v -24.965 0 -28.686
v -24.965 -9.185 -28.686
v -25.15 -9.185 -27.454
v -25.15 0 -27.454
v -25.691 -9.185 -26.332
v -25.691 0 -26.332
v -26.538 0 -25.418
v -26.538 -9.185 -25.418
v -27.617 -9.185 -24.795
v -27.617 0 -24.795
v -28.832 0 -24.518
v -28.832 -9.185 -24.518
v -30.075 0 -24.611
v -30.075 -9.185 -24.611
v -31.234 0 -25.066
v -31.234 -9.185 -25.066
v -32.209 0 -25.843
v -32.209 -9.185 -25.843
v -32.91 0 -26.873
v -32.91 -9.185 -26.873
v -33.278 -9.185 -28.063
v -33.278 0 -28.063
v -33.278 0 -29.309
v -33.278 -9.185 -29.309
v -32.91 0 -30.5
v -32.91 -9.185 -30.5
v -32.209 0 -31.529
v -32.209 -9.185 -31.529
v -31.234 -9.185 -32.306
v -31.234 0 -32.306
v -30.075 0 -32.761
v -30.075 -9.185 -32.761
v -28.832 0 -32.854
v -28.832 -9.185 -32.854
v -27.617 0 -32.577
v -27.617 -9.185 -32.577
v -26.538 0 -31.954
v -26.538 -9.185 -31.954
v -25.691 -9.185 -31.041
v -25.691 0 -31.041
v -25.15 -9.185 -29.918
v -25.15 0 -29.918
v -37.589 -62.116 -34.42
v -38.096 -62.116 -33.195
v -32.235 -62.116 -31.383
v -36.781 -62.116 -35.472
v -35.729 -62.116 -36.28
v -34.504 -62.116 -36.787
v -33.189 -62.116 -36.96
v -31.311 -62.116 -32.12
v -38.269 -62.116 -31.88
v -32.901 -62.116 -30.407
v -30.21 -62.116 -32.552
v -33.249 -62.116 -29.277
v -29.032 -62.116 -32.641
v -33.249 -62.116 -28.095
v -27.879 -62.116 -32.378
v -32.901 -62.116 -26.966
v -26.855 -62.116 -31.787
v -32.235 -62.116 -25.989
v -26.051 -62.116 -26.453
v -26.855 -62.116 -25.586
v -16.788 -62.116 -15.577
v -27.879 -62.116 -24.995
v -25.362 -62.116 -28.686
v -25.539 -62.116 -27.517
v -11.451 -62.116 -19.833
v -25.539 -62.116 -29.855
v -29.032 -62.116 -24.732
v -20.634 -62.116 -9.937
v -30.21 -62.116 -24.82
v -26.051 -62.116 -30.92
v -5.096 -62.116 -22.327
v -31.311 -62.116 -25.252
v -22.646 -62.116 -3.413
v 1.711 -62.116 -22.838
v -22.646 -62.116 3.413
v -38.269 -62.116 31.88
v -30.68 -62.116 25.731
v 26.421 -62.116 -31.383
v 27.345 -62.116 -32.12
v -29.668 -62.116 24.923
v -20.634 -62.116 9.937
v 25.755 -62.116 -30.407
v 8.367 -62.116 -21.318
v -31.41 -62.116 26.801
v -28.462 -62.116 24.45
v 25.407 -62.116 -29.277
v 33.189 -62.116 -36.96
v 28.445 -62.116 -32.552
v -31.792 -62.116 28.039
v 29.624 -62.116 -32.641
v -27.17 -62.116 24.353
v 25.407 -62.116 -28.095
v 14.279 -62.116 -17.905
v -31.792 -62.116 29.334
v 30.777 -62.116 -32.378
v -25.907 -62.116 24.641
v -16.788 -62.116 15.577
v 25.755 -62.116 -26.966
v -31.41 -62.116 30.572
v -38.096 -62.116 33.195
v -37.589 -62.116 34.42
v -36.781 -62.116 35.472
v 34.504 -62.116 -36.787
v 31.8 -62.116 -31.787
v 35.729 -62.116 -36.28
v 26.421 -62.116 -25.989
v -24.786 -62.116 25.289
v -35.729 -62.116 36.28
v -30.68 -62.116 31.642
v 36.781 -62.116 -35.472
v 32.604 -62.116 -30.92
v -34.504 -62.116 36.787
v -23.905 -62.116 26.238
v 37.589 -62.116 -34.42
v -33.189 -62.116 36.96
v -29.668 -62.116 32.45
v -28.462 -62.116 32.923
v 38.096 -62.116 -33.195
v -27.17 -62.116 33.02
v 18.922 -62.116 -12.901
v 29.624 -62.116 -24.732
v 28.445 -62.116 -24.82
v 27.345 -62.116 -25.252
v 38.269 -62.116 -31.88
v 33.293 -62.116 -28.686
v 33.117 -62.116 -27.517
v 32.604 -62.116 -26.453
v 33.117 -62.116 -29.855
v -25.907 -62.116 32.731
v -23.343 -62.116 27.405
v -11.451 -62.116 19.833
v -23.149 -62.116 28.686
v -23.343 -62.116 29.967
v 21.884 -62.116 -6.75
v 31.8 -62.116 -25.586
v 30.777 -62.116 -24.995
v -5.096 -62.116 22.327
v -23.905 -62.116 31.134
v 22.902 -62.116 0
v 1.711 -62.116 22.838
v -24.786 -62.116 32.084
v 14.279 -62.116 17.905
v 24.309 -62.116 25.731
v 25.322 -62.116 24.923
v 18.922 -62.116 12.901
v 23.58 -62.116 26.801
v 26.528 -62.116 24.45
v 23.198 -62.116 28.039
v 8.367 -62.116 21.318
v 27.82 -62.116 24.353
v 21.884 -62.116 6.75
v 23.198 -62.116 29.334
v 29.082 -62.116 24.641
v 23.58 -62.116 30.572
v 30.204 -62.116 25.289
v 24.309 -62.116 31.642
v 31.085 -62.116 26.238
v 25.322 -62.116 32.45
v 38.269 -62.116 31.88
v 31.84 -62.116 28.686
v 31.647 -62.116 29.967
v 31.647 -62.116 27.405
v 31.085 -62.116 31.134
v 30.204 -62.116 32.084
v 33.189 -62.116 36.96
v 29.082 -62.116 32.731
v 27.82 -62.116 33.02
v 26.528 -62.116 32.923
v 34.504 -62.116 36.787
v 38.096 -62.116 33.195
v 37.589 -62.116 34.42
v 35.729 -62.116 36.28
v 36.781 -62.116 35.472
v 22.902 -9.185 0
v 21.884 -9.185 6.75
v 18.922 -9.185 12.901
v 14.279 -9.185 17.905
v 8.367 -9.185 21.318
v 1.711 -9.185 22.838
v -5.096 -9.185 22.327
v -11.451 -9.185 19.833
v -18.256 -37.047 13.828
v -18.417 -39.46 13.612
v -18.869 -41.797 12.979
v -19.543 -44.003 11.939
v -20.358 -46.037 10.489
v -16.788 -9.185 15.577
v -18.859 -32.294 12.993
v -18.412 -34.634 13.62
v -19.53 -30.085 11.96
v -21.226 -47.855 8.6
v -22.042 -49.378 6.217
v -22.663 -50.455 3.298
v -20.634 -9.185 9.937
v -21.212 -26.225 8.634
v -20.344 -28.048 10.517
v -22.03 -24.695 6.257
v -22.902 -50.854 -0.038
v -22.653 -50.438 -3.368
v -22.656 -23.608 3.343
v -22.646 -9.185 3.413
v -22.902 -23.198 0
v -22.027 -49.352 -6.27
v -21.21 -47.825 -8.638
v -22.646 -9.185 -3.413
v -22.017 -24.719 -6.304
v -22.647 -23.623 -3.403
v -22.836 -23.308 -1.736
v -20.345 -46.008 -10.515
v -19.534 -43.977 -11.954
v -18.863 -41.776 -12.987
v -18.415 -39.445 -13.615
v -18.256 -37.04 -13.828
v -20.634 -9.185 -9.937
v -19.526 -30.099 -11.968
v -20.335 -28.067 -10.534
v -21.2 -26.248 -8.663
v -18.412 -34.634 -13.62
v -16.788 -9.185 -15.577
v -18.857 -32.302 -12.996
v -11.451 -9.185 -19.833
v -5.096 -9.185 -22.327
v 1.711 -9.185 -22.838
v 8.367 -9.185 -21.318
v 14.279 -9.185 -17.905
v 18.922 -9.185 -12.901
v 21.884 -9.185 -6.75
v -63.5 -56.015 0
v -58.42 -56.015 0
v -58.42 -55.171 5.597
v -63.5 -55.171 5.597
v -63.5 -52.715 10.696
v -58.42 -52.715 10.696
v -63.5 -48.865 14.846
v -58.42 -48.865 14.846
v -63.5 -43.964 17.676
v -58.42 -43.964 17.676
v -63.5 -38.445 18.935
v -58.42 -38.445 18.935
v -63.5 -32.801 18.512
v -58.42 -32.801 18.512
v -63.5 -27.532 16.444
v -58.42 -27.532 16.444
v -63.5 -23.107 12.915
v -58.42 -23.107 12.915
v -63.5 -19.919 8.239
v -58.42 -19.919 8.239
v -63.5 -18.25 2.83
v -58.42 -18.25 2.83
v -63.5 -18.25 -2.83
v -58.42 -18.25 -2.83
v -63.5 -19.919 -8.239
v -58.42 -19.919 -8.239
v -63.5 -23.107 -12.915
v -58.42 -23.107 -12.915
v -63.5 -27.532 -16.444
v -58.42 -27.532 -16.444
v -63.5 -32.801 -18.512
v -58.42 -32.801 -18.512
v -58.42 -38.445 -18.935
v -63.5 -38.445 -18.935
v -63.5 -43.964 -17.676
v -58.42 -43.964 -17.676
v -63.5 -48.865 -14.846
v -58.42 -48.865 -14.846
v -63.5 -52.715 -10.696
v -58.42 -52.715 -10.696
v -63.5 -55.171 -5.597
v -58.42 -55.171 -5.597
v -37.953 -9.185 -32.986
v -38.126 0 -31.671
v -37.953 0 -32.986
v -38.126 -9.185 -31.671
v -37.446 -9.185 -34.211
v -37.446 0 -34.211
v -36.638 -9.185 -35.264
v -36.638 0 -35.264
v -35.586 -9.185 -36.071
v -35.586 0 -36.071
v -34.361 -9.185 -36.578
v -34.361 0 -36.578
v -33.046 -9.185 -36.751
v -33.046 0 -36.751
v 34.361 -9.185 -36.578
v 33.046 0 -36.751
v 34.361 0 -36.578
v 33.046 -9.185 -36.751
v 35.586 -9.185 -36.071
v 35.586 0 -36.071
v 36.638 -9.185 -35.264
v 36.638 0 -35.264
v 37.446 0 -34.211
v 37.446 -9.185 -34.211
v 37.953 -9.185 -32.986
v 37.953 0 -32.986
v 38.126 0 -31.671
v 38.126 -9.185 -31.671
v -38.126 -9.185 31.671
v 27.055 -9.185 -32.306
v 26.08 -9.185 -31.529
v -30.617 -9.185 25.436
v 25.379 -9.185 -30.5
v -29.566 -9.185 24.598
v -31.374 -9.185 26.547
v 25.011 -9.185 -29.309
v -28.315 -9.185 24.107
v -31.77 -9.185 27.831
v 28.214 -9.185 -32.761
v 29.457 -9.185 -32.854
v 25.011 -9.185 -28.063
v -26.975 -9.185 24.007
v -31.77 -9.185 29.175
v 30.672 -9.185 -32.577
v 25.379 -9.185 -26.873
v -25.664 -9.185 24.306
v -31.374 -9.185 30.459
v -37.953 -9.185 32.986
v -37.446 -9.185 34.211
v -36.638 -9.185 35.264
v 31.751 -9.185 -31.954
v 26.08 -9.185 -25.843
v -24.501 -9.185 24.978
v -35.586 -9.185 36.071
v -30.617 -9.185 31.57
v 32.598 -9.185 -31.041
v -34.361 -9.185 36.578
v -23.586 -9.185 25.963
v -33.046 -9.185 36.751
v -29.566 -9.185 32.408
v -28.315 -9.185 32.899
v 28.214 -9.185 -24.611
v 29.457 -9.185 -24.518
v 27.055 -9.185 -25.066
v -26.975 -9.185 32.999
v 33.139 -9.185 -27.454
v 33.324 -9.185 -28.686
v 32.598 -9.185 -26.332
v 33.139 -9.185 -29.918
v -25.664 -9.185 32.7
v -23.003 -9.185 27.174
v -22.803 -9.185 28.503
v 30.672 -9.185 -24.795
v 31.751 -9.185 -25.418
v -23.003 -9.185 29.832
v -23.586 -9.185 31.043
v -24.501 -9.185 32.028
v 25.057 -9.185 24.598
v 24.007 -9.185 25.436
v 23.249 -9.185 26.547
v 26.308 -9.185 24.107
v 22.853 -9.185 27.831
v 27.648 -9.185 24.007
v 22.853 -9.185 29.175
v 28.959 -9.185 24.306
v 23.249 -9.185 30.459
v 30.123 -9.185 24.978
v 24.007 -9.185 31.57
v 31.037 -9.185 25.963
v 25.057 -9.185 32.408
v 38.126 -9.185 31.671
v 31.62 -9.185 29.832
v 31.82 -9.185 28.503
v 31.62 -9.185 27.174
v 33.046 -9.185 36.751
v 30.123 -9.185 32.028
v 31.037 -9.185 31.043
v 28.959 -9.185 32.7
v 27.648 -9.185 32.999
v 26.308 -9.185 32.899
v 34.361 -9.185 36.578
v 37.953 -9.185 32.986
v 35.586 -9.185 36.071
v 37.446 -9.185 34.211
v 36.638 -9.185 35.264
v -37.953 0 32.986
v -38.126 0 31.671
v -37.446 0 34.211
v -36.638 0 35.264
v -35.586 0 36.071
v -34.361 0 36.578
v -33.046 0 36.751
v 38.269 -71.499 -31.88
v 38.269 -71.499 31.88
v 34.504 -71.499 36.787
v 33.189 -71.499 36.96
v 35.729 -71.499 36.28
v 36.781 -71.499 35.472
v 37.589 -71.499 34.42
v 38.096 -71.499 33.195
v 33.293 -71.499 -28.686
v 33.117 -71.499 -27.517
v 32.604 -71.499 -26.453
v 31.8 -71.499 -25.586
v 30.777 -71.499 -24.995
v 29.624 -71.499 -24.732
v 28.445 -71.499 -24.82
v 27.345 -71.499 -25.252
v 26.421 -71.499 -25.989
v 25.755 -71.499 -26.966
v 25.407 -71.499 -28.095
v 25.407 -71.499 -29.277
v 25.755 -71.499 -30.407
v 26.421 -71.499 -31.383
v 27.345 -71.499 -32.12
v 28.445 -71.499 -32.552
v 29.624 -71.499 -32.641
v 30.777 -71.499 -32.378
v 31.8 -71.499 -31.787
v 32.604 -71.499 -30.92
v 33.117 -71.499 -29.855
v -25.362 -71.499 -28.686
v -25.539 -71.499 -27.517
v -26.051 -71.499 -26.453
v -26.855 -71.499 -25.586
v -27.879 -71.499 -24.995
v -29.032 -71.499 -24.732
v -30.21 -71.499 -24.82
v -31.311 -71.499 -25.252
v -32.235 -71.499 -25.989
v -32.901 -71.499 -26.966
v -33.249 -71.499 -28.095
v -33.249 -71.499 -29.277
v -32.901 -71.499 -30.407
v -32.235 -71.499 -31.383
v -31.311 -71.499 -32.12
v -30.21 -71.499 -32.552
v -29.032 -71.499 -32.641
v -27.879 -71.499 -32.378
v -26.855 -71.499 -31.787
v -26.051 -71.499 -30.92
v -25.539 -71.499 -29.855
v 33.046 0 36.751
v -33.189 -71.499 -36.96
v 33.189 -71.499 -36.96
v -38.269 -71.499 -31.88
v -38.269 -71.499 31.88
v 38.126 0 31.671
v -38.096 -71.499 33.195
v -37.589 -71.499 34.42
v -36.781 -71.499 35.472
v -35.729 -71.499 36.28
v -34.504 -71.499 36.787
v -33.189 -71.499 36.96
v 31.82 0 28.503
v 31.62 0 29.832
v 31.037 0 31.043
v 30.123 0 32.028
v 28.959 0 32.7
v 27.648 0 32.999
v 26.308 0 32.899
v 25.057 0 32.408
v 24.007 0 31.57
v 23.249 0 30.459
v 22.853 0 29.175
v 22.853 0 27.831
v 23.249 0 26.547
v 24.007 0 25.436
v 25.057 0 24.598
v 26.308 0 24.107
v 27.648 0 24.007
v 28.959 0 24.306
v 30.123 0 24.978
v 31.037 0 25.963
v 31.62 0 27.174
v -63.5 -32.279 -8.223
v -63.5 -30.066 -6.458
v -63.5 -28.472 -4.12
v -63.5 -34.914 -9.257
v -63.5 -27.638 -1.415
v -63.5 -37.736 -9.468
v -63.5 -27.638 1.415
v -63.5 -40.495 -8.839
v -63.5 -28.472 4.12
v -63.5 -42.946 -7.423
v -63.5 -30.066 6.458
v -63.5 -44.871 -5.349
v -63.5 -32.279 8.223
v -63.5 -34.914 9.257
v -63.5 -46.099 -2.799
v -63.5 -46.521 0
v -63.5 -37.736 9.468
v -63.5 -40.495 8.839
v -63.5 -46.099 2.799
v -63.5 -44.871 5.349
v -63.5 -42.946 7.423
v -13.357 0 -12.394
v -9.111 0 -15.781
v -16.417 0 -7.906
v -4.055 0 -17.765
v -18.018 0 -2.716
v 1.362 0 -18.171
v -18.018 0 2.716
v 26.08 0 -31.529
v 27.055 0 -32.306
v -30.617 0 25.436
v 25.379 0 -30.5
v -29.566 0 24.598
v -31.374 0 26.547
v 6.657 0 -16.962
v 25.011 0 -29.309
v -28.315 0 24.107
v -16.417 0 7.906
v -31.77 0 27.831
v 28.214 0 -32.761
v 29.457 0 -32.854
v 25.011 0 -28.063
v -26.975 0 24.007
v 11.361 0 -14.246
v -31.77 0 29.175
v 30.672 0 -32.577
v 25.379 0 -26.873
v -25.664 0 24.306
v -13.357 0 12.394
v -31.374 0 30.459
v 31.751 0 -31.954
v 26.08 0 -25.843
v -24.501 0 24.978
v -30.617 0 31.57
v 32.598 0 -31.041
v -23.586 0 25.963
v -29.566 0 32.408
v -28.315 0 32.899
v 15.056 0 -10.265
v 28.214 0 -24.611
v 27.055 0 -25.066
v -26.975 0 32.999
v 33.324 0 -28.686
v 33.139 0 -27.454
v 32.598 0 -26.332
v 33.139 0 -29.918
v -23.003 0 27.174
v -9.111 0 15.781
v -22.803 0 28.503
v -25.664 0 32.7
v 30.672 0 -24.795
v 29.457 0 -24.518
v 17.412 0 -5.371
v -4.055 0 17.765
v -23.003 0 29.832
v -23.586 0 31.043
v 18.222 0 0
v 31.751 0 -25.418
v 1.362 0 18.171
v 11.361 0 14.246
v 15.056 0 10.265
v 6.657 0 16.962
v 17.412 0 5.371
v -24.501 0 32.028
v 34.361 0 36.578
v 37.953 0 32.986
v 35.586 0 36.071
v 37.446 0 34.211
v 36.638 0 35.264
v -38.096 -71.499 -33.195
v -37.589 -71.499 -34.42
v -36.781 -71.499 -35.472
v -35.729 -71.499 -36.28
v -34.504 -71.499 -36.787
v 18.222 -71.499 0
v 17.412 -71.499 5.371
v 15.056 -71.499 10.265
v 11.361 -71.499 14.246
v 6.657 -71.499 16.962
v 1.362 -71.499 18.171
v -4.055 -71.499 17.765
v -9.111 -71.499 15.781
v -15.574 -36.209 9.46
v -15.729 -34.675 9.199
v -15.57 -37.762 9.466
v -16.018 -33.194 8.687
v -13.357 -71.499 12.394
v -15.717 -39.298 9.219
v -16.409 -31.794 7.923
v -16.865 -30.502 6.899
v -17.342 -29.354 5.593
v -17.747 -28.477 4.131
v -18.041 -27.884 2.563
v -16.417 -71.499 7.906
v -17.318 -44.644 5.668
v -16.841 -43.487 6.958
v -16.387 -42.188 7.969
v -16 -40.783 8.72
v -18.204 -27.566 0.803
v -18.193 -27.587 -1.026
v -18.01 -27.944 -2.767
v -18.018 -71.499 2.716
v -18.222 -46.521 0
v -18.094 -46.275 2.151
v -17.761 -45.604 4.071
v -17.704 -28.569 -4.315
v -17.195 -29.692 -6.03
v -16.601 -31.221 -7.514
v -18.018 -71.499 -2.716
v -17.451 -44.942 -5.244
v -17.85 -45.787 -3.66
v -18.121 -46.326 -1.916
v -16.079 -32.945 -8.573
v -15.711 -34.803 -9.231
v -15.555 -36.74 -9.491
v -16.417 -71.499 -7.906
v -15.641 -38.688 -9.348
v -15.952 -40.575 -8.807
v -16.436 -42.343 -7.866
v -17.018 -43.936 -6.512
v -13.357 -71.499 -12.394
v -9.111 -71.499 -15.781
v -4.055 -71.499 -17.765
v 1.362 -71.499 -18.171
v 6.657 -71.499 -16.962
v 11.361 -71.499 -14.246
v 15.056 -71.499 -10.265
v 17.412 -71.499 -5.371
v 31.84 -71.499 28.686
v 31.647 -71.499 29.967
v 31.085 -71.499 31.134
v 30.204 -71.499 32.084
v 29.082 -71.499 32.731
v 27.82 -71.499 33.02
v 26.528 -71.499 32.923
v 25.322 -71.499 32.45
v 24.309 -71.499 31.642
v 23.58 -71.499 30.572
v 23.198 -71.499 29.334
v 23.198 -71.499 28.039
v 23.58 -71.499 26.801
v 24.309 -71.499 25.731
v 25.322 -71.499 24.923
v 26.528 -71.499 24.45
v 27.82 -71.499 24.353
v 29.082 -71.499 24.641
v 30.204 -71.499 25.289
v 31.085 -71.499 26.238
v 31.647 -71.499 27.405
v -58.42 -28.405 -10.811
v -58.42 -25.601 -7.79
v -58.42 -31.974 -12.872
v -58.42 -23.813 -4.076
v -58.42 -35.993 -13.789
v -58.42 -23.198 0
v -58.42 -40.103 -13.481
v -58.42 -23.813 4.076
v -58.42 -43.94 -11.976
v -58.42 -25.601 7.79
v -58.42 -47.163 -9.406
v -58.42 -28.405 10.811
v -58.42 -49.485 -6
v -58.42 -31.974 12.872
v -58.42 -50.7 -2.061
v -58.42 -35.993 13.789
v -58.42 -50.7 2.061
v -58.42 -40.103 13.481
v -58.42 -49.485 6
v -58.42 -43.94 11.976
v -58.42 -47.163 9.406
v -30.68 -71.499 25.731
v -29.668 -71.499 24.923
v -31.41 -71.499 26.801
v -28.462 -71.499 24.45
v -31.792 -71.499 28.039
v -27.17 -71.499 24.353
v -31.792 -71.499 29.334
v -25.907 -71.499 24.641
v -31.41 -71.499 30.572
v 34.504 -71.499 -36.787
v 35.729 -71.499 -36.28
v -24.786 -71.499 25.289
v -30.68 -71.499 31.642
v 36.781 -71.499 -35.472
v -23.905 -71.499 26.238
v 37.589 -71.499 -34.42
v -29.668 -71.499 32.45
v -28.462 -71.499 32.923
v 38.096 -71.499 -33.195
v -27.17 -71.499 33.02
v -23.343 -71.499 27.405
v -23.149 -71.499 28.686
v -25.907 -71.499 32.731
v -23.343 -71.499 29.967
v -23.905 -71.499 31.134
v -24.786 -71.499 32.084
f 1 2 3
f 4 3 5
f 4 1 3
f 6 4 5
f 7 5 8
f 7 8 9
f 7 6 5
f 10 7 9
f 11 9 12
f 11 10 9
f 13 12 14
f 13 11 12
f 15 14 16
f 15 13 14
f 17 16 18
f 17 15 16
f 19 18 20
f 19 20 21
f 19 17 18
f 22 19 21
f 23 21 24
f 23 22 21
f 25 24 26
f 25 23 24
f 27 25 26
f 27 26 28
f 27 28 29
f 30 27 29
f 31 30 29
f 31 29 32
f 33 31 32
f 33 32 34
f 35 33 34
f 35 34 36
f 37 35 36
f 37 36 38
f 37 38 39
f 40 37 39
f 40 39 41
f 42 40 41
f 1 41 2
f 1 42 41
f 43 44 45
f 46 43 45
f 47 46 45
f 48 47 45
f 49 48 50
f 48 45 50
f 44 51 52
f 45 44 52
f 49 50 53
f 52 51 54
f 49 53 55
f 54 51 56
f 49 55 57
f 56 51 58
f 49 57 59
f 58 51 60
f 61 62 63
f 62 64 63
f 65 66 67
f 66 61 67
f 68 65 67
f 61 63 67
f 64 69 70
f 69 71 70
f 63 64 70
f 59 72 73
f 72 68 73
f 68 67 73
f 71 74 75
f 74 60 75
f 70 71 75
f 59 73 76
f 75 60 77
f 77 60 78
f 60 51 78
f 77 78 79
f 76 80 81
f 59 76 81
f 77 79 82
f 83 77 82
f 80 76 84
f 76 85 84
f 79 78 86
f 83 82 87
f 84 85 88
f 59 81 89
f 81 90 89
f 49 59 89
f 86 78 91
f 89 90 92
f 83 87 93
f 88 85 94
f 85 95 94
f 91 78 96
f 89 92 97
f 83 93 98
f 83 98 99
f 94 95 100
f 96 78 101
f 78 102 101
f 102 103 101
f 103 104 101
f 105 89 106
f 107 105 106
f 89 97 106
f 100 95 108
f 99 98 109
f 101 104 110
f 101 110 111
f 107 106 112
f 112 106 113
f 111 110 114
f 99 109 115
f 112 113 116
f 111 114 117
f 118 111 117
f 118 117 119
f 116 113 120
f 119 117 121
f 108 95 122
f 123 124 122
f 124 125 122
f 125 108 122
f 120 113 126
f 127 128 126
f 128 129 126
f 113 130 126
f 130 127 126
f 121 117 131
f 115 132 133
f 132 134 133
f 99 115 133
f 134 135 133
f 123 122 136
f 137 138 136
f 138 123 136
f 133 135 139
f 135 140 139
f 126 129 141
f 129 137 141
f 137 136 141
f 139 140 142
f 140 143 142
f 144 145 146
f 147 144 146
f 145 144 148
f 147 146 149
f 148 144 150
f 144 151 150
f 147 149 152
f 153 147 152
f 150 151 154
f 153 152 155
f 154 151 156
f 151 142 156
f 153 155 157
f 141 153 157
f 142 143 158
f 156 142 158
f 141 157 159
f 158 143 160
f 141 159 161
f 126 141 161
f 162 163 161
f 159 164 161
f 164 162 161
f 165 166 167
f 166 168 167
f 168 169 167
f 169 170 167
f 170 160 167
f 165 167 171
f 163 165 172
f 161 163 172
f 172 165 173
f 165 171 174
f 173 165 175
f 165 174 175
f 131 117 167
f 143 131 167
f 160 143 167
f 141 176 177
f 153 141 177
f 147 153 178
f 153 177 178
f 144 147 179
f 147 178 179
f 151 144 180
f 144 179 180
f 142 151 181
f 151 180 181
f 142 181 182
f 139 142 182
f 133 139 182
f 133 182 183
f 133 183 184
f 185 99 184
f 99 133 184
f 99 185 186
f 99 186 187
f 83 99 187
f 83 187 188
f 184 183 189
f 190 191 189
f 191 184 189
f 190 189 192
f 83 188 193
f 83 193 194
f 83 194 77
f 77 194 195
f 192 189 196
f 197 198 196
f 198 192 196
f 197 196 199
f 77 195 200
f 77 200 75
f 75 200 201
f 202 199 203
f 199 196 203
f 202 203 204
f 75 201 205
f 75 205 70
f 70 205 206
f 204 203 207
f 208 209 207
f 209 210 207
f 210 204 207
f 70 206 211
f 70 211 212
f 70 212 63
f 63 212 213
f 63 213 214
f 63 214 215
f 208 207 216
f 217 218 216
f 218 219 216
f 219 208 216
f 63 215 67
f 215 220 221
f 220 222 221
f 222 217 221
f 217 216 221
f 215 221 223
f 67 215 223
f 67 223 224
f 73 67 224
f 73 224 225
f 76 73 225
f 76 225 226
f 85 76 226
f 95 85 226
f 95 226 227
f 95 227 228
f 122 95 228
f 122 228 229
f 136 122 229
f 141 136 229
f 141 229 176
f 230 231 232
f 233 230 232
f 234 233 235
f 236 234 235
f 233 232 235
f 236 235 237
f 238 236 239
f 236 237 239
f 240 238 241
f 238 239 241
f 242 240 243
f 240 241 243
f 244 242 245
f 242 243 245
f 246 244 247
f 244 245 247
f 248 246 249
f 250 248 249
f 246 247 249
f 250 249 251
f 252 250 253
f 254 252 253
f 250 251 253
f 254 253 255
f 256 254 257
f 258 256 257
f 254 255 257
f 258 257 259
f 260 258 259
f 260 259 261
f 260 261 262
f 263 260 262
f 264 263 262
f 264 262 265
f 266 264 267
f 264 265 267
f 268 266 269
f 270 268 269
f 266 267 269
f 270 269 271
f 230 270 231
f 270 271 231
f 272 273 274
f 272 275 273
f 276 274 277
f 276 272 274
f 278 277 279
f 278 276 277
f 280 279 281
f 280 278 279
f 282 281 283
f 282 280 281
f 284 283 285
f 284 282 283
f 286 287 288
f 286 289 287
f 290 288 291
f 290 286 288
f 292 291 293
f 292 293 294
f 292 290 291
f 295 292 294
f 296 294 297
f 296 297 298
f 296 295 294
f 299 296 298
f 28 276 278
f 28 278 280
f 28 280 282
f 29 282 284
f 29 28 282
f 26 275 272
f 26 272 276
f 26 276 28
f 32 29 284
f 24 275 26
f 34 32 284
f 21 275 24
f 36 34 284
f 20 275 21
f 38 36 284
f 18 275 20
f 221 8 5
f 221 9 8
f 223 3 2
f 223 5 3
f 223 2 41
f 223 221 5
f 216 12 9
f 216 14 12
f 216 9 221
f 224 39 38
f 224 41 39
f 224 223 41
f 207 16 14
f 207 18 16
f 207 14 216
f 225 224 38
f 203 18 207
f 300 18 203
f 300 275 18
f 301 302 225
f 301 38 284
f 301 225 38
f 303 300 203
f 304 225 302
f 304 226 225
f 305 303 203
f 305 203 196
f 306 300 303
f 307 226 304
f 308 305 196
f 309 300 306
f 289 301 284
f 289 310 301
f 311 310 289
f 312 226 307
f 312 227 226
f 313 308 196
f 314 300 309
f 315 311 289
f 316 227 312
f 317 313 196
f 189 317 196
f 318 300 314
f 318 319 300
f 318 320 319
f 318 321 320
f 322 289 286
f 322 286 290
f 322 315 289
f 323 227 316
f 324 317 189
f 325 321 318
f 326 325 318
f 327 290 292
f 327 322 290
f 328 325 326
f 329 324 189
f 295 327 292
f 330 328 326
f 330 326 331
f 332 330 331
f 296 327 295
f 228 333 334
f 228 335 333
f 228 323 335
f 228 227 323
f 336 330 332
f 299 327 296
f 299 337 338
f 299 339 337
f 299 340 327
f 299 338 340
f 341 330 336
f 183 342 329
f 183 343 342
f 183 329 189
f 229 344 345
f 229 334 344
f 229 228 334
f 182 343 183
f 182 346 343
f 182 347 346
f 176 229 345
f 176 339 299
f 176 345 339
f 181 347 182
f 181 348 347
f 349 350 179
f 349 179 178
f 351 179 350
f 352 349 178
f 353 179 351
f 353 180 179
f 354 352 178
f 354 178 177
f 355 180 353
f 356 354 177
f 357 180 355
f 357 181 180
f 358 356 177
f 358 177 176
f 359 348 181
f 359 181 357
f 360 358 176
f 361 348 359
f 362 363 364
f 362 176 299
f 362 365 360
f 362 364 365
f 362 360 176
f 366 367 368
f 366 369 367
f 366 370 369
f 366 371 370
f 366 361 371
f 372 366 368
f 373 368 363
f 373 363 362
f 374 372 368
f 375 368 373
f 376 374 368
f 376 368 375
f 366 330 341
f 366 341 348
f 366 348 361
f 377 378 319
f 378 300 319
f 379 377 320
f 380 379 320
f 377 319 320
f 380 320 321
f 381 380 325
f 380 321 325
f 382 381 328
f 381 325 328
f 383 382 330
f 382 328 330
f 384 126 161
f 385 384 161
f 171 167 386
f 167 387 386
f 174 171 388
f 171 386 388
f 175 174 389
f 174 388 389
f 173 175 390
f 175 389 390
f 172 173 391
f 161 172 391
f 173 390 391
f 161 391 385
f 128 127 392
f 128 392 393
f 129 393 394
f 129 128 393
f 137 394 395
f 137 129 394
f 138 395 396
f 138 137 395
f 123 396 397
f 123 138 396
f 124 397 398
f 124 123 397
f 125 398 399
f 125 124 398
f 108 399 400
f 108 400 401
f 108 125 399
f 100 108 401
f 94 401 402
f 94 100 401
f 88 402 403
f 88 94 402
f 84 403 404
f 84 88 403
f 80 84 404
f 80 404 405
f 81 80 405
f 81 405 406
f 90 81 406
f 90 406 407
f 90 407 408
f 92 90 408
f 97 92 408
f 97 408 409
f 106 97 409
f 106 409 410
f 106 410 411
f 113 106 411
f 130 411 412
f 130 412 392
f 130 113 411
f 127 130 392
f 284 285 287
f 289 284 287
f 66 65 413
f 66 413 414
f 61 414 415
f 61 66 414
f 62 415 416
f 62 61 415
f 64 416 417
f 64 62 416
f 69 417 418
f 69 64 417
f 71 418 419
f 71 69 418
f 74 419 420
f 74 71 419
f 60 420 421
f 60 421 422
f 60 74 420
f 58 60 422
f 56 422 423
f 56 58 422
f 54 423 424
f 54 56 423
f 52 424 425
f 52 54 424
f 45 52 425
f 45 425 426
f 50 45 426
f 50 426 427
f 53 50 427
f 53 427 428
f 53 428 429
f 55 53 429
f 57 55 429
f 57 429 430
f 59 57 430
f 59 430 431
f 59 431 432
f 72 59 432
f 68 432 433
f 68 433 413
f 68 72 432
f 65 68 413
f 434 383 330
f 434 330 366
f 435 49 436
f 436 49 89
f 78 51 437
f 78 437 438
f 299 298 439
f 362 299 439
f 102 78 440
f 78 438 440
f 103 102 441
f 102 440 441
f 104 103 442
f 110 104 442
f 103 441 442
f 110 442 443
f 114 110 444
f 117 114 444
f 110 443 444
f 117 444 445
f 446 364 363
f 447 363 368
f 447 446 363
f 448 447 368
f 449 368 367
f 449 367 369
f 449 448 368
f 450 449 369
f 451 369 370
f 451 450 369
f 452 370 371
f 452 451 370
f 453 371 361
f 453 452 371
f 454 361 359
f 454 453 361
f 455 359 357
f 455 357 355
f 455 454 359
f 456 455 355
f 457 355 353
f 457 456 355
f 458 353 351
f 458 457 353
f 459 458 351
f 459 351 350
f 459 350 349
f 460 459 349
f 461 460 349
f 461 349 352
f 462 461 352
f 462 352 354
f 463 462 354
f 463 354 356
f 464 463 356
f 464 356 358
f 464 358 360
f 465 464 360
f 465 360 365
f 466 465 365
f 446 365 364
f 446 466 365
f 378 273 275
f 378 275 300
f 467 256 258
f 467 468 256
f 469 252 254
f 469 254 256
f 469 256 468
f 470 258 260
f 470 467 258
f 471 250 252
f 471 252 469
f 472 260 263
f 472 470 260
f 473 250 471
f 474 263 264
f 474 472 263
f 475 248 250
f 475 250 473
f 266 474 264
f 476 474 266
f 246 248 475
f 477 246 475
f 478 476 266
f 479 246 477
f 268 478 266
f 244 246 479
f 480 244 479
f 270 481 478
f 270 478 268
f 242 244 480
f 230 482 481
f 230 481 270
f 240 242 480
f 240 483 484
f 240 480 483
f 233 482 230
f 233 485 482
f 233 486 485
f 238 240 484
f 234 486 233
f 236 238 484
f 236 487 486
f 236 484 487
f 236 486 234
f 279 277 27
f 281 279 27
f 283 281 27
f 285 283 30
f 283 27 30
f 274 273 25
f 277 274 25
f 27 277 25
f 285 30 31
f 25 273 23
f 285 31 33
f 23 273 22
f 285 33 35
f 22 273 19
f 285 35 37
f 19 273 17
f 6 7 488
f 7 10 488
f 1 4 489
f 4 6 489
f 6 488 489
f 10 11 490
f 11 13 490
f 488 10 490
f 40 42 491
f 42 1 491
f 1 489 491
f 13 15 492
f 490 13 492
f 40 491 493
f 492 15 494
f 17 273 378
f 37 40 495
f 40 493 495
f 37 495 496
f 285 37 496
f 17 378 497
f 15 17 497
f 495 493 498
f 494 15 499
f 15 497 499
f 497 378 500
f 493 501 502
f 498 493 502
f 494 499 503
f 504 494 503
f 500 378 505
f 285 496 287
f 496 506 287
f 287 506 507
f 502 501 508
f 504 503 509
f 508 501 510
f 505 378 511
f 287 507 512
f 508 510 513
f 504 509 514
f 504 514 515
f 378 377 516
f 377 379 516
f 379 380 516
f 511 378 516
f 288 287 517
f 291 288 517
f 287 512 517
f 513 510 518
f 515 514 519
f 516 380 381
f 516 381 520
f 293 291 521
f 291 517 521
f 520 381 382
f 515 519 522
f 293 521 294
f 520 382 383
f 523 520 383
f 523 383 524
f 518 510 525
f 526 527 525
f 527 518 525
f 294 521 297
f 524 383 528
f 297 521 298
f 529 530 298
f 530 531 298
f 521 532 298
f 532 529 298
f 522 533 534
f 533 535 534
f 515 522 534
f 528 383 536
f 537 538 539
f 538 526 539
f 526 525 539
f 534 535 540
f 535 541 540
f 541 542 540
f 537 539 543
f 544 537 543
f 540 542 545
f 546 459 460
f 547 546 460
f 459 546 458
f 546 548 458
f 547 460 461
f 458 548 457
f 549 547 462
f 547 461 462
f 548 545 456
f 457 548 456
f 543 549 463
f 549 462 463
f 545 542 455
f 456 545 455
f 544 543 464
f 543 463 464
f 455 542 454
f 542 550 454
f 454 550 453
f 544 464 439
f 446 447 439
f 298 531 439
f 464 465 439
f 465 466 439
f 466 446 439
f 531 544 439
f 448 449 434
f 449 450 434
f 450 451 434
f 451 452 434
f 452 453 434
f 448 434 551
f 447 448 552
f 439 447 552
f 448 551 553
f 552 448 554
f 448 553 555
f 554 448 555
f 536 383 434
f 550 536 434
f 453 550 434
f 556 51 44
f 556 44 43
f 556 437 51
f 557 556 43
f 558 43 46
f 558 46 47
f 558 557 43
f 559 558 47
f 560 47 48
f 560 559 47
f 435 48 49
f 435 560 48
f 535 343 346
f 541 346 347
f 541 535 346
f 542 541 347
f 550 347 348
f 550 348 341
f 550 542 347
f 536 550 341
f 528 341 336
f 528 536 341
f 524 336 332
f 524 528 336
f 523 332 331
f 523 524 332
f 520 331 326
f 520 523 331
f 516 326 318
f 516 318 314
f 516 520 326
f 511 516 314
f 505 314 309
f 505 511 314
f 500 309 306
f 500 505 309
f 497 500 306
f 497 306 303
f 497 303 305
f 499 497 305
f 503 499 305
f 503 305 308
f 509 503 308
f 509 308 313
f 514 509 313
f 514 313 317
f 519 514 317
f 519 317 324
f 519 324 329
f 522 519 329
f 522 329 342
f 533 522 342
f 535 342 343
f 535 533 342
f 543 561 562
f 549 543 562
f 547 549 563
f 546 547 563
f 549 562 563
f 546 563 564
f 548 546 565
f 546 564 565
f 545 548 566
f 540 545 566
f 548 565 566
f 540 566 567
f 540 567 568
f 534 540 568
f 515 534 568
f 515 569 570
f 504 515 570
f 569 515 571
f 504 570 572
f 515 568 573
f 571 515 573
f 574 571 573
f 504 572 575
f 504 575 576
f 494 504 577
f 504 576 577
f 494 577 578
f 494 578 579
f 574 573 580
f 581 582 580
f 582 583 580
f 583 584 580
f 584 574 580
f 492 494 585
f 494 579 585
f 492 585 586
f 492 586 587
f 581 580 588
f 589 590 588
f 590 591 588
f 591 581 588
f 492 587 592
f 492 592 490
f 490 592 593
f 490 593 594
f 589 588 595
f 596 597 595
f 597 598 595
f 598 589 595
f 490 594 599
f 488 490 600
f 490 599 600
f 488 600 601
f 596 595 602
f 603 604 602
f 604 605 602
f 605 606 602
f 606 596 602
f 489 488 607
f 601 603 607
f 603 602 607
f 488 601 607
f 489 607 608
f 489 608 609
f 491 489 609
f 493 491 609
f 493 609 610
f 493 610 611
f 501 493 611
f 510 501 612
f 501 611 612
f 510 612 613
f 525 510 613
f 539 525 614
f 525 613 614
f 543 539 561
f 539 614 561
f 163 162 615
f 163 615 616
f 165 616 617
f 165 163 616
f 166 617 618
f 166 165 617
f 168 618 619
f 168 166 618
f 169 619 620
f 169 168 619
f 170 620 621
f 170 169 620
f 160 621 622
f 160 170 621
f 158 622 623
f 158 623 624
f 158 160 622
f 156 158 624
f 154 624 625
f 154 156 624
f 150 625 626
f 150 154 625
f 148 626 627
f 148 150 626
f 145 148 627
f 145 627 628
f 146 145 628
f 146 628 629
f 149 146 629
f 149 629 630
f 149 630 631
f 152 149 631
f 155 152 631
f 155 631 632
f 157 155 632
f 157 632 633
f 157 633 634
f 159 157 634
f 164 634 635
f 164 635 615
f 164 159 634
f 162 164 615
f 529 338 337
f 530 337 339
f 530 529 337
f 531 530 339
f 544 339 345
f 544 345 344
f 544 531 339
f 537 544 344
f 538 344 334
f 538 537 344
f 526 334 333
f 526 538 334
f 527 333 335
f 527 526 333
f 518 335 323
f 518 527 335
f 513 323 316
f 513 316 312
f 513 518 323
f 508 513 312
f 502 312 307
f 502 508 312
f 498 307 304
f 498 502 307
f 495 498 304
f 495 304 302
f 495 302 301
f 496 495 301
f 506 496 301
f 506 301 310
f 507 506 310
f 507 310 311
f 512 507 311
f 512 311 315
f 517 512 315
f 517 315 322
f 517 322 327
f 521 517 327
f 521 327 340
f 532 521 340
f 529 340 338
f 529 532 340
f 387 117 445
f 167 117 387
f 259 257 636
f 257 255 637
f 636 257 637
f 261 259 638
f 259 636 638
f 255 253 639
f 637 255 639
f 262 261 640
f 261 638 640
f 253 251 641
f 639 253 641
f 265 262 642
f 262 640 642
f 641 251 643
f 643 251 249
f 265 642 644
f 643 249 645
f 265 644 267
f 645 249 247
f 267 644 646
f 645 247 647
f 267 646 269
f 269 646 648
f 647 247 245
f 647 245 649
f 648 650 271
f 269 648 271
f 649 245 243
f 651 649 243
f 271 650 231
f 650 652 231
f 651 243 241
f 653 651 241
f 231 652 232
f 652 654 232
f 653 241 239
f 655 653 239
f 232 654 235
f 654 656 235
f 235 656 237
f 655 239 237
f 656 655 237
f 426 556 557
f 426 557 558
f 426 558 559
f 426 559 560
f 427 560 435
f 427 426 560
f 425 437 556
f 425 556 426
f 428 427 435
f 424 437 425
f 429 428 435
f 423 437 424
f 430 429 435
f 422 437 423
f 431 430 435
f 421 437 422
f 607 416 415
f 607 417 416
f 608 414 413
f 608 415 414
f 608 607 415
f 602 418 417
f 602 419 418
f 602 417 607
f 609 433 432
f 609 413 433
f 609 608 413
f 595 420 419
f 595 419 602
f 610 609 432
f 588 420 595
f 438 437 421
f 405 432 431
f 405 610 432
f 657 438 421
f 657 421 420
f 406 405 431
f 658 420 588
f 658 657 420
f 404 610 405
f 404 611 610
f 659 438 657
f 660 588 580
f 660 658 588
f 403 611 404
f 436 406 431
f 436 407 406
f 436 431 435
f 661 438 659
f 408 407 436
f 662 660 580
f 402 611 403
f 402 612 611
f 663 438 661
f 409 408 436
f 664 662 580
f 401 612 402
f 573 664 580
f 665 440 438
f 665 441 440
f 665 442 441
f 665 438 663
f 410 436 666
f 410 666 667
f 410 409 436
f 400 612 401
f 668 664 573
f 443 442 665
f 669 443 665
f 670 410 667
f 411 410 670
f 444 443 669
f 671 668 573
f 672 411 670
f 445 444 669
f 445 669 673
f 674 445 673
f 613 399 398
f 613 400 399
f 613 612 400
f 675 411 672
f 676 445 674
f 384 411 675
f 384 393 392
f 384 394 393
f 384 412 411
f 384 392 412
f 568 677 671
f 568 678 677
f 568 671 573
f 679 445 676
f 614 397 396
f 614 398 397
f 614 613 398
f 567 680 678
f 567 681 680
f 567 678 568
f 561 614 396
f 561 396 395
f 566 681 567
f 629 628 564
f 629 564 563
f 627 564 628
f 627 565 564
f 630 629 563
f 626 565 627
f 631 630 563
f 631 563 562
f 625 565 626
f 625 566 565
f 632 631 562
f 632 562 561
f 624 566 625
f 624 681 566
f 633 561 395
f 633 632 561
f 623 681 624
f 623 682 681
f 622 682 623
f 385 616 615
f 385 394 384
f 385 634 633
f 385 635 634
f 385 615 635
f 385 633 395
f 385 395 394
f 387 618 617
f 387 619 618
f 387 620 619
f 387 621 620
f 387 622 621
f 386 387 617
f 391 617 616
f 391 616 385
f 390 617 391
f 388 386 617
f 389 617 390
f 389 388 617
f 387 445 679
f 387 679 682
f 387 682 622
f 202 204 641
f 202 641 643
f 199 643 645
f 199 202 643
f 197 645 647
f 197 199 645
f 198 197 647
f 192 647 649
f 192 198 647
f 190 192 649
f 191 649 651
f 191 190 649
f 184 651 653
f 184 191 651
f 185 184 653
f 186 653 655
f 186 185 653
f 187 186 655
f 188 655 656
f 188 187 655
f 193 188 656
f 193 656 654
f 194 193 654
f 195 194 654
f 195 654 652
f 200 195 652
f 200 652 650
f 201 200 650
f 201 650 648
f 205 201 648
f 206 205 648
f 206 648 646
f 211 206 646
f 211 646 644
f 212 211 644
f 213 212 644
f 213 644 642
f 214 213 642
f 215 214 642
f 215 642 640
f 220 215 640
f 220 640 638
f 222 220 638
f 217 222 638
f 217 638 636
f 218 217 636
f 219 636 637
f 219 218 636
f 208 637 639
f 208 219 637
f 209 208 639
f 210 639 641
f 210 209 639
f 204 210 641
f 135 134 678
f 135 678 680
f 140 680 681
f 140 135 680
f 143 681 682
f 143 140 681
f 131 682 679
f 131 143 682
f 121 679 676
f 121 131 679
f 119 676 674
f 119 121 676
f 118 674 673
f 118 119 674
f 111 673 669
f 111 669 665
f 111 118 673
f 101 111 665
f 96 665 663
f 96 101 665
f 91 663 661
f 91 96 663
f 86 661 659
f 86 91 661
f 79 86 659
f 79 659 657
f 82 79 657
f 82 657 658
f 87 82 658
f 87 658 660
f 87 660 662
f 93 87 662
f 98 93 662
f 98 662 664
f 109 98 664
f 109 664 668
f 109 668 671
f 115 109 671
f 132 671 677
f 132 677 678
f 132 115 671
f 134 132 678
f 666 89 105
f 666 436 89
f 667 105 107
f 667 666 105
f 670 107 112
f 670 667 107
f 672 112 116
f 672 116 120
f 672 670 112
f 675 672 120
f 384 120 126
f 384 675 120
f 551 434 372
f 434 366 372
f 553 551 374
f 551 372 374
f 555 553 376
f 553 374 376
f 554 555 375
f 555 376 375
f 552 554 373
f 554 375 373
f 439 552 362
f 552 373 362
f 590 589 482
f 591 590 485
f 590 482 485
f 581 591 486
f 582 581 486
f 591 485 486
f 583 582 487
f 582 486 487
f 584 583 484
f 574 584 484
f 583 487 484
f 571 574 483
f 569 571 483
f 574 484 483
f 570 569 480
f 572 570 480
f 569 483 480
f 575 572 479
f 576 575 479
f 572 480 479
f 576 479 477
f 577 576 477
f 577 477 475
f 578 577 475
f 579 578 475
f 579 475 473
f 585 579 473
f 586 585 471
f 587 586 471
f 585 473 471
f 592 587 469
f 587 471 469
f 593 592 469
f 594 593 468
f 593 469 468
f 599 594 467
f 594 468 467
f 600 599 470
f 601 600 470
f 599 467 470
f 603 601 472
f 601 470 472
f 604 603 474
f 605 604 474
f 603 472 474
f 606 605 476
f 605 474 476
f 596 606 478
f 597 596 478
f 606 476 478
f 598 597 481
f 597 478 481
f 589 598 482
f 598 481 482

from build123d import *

# Parameters (mm, degrees)
F0_W      = 76.252372
F0_H      = 73.50289
F0_R      = 4.179859
F0_R_2    = 4.50856
F1_DEPTH  = 9.18545
F2_R      = 5.08
F3_R      = 22.901555
F4_DEPTH  = 62.1159
F5_W      = 76.538578
F5_H      = 73.920212
F5_R      = 3.965364
F5_R_2    = 4.345385
F6_DEPTH  = 9.38346
F7_R      = 5.08
F8_R      = 18.221754
F9_DEPTH  = 71.50036
F10_R     = 13.828143
F11_DEPTH = 58.42
F12_DEPTH = 71.3616
F13_DEPTH = 71.50036
F15_R     = 18.988261
F16_DEPTH = 5.08
F14_R     = 9.494903
F17_DEPTH = 57.11392


with BuildPart() as f1:
    # F0 (on Front) → F1 (new body)
    with BuildSketch(Plane.XZ):
        Rectangle(F0_W, F0_H)
        with Locations((-29.144537, -28.686289)):
            Circle(F0_R, mode=Mode.SUBTRACT)
        with Locations((29.144537, -28.686289)):
            Circle(F0_R, mode=Mode.SUBTRACT)
        with Locations((-27.311549, 28.50299)):
            Circle(F0_R_2, mode=Mode.SUBTRACT)
        with Locations((27.311549, 28.50299)):
            Circle(F0_R_2, mode=Mode.SUBTRACT)
    extrude(amount=F1_DEPTH)

    # F2
    f2_edges = [f1.edges().sort_by_distance(p)[0] for p in [
        (38.126186, -4.592725, 36.751445),
        (-38.126186, -4.592725, 36.751445),
        (-38.126186, -4.592725, -36.751445),
        (38.126186, -4.592725, -36.751445),
    ]]
    fillet(f2_edges, radius=F2_R)

    # F3 (on Front) → F4 (join)
    with BuildSketch(Plane.XZ):
        Circle(F3_R)
    extrude(amount=F4_DEPTH)

    # F5 (on face) → F6 (join)
    with BuildSketch(Plane.XZ.offset(62.1159)):
        Rectangle(F5_W, F5_H)
        with Locations((-29.327836, -28.686289)):
            Circle(F5_R, mode=Mode.SUBTRACT)
        with Locations((29.327836, -28.686289)):
            Circle(F5_R, mode=Mode.SUBTRACT)
        with Locations((-27.494846, 28.686289)):
            Circle(F5_R_2, mode=Mode.SUBTRACT)
        with Locations((27.494846, 28.686289)):
            Circle(F5_R_2, mode=Mode.SUBTRACT)
    extrude(amount=F6_DEPTH)

    # F7
    f7_edges = [f1.edges().sort_by_distance(p)[0] for p in [
        (38.269289, -66.80763, 36.960106),
        (-38.269289, -66.80763, 36.960106),
        (-38.269289, -66.80763, -36.960106),
        (38.269289, -66.80763, -36.960106),
    ]]
    fillet(f7_edges, radius=F7_R)

    # F8 (on face) → F9 (cut, through all)
    with BuildSketch(Plane.XZ.offset(71.49936)):
        Circle(F8_R)
    extrude(amount=-F9_DEPTH, mode=Mode.SUBTRACT)

    # F10 (on Right) → F11 (join)
    with BuildSketch(Plane.YZ):
        with Locations((-37.026394, 0)):
            Circle(F10_R)
    extrude(amount=-F11_DEPTH)

    # F3 (on Front) → F12 (join)
    with BuildSketch(Plane.XZ):
        Circle(F3_R)
    extrude(amount=F12_DEPTH)

    # F8 (on face) → F13 (cut, through all)
    with BuildSketch(Plane.XZ.offset(71.49936)):
        Circle(F8_R)
    extrude(amount=-F13_DEPTH, mode=Mode.SUBTRACT)

    # F15 (on face) → F16 (join)
    with BuildSketch(Plane(origin=(-58.42, 0, 0), x_dir=(0, -1, 0), z_dir=(-1, 0, 0))):
        with Locations((37.026394, 0)):
            Circle(F15_R)
    extrude(amount=F16_DEPTH)

    # F14 (on face) → F17 (cut, symmetric)
    with BuildSketch(Plane(origin=(-58.42, 0, 0), x_dir=(0, -1, 0), z_dir=(-1, 0, 0))):
        with Locations((37.026394, 0)):
            Circle(F14_R)
    extrude(amount=F17_DEPTH, both=True, mode=Mode.SUBTRACT)


solid = f1.part
